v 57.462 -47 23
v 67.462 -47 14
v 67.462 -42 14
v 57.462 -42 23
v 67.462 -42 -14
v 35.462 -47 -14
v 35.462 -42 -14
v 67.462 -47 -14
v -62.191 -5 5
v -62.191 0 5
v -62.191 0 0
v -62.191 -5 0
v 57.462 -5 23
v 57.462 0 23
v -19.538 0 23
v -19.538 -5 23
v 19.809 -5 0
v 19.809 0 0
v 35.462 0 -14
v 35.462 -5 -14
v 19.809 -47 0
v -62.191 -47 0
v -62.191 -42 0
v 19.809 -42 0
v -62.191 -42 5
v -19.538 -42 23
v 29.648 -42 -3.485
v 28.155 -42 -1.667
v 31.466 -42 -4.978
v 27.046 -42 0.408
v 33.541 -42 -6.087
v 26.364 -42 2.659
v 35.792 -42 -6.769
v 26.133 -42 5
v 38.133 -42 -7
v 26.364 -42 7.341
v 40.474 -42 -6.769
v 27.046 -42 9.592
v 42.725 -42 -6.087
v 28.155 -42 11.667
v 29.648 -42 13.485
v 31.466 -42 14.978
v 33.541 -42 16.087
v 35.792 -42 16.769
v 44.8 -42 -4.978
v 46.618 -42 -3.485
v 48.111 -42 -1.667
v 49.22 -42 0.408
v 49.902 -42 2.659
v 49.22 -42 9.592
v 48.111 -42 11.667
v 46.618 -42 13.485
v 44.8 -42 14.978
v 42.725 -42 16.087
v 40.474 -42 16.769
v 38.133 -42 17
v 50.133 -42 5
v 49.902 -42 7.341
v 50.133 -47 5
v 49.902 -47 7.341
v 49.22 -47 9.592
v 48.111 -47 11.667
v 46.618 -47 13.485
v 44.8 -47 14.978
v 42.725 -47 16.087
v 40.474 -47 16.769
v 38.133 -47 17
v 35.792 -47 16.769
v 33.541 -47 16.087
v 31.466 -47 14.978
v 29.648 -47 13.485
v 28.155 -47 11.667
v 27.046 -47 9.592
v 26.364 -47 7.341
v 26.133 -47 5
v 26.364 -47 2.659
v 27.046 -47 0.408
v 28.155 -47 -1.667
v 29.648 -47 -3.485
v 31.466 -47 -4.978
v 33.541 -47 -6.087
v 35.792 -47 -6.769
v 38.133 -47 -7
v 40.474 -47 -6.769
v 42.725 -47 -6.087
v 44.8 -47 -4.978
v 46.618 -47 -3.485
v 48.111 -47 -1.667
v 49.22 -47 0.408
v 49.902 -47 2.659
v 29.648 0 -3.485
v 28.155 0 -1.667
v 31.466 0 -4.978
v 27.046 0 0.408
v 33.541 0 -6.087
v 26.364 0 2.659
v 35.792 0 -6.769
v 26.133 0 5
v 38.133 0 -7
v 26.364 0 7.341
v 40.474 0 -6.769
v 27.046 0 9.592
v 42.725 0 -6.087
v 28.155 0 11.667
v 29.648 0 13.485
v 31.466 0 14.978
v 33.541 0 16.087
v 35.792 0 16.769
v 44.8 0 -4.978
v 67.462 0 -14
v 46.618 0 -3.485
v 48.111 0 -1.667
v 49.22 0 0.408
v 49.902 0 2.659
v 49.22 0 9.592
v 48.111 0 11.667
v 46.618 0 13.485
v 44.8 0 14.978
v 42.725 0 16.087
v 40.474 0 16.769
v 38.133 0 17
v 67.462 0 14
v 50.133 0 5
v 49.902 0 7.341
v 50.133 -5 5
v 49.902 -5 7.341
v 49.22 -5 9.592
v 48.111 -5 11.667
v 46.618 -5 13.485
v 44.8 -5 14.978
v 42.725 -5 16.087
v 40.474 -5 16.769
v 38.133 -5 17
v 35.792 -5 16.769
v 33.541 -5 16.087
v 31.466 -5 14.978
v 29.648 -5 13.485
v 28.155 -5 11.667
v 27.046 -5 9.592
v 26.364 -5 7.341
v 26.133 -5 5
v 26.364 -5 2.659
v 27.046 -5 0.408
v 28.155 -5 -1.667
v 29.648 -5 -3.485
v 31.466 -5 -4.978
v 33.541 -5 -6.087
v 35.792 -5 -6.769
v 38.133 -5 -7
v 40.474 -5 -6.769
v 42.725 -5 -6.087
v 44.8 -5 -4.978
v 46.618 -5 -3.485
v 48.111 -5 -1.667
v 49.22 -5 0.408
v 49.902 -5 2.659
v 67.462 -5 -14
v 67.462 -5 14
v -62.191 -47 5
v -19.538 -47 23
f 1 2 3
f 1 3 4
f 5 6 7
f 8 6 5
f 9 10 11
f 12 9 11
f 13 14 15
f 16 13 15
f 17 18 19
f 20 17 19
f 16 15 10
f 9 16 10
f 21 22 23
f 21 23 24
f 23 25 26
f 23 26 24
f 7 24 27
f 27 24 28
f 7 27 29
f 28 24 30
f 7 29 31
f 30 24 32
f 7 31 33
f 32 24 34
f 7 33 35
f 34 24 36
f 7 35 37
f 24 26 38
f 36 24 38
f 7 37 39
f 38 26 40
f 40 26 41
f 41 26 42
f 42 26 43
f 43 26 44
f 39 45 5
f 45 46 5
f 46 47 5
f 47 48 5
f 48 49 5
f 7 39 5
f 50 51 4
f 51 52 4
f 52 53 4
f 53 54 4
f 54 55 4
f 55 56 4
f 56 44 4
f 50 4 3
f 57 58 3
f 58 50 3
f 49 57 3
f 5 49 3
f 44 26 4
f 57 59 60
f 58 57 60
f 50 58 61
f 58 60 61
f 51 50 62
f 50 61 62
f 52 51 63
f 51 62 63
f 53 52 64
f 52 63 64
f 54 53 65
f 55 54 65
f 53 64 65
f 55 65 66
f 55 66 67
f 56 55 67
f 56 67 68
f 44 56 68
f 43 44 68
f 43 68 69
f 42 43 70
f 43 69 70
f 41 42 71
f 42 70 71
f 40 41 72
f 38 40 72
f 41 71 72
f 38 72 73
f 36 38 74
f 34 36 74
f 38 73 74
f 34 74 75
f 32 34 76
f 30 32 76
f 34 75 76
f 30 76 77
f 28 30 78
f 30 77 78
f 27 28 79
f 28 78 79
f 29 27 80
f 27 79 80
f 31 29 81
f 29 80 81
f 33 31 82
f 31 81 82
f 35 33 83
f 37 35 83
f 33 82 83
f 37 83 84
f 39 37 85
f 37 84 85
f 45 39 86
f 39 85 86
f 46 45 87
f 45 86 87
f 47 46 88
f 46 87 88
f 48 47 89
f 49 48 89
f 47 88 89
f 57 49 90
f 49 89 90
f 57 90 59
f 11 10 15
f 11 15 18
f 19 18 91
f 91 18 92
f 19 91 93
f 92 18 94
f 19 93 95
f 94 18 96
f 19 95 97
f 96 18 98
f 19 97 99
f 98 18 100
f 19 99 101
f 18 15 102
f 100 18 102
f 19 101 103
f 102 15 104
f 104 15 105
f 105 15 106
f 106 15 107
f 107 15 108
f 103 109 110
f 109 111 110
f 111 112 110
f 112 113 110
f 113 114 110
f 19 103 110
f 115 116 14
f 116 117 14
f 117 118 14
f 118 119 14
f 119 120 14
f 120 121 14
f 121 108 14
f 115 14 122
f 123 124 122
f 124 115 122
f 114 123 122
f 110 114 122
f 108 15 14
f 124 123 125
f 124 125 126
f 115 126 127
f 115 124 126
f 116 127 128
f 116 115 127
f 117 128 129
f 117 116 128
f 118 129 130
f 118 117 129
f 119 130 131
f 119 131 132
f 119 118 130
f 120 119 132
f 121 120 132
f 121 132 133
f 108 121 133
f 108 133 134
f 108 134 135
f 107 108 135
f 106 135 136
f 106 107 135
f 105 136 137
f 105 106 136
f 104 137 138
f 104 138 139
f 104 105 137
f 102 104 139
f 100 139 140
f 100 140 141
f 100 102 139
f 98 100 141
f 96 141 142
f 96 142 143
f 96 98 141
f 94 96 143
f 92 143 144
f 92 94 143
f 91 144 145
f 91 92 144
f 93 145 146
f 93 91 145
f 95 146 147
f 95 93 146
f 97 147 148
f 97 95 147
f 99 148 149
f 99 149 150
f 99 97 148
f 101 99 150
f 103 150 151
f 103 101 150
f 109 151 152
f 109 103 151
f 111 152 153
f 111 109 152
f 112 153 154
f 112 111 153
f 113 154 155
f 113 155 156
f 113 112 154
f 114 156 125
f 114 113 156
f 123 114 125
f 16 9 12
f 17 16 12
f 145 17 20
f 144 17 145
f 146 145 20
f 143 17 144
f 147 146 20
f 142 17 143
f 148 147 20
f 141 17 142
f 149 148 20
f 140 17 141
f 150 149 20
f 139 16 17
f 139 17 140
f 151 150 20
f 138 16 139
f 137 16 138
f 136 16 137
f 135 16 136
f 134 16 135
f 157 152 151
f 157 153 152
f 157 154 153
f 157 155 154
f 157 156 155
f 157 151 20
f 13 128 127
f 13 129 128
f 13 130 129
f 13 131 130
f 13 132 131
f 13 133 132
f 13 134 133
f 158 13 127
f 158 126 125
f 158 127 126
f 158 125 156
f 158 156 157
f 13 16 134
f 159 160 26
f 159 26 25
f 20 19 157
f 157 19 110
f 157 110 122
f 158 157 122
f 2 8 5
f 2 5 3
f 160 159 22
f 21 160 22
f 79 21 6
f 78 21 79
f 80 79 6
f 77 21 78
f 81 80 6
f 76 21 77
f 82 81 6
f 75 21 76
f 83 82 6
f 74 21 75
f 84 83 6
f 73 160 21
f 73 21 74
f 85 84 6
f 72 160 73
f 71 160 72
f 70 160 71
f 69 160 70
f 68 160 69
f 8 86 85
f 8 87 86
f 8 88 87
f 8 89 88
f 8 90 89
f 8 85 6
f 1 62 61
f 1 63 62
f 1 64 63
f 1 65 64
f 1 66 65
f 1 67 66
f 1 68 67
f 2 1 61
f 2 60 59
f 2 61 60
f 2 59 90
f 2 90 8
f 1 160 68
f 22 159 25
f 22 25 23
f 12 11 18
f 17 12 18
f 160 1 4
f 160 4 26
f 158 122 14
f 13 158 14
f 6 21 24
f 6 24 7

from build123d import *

# Parameters (mm, degrees)
F0_R     = 12
F1_DEPTH = 5


with BuildPart() as f1:
    # F0 (on Front) → F1 (new body)
    with BuildSketch(Plane.XZ):
        Polygon((67.46152, -14), (67.46152, 14), (57.46152, 23), (-19.53848, 23), (-62.190956, 5), (-62.190956, 0), (19.809044, 0), (35.46152, -14), align=None)
        with Locations((38.132965, 5)):
            Circle(F0_R, mode=Mode.SUBTRACT)
    extrude(amount=F1_DEPTH)


with BuildPart() as f3_1:
    # F3: instance of F1
    add(f1.part.mirror(Plane.XZ.offset(23.5)))


solid = Compound([f1.part, f3_1.part])
